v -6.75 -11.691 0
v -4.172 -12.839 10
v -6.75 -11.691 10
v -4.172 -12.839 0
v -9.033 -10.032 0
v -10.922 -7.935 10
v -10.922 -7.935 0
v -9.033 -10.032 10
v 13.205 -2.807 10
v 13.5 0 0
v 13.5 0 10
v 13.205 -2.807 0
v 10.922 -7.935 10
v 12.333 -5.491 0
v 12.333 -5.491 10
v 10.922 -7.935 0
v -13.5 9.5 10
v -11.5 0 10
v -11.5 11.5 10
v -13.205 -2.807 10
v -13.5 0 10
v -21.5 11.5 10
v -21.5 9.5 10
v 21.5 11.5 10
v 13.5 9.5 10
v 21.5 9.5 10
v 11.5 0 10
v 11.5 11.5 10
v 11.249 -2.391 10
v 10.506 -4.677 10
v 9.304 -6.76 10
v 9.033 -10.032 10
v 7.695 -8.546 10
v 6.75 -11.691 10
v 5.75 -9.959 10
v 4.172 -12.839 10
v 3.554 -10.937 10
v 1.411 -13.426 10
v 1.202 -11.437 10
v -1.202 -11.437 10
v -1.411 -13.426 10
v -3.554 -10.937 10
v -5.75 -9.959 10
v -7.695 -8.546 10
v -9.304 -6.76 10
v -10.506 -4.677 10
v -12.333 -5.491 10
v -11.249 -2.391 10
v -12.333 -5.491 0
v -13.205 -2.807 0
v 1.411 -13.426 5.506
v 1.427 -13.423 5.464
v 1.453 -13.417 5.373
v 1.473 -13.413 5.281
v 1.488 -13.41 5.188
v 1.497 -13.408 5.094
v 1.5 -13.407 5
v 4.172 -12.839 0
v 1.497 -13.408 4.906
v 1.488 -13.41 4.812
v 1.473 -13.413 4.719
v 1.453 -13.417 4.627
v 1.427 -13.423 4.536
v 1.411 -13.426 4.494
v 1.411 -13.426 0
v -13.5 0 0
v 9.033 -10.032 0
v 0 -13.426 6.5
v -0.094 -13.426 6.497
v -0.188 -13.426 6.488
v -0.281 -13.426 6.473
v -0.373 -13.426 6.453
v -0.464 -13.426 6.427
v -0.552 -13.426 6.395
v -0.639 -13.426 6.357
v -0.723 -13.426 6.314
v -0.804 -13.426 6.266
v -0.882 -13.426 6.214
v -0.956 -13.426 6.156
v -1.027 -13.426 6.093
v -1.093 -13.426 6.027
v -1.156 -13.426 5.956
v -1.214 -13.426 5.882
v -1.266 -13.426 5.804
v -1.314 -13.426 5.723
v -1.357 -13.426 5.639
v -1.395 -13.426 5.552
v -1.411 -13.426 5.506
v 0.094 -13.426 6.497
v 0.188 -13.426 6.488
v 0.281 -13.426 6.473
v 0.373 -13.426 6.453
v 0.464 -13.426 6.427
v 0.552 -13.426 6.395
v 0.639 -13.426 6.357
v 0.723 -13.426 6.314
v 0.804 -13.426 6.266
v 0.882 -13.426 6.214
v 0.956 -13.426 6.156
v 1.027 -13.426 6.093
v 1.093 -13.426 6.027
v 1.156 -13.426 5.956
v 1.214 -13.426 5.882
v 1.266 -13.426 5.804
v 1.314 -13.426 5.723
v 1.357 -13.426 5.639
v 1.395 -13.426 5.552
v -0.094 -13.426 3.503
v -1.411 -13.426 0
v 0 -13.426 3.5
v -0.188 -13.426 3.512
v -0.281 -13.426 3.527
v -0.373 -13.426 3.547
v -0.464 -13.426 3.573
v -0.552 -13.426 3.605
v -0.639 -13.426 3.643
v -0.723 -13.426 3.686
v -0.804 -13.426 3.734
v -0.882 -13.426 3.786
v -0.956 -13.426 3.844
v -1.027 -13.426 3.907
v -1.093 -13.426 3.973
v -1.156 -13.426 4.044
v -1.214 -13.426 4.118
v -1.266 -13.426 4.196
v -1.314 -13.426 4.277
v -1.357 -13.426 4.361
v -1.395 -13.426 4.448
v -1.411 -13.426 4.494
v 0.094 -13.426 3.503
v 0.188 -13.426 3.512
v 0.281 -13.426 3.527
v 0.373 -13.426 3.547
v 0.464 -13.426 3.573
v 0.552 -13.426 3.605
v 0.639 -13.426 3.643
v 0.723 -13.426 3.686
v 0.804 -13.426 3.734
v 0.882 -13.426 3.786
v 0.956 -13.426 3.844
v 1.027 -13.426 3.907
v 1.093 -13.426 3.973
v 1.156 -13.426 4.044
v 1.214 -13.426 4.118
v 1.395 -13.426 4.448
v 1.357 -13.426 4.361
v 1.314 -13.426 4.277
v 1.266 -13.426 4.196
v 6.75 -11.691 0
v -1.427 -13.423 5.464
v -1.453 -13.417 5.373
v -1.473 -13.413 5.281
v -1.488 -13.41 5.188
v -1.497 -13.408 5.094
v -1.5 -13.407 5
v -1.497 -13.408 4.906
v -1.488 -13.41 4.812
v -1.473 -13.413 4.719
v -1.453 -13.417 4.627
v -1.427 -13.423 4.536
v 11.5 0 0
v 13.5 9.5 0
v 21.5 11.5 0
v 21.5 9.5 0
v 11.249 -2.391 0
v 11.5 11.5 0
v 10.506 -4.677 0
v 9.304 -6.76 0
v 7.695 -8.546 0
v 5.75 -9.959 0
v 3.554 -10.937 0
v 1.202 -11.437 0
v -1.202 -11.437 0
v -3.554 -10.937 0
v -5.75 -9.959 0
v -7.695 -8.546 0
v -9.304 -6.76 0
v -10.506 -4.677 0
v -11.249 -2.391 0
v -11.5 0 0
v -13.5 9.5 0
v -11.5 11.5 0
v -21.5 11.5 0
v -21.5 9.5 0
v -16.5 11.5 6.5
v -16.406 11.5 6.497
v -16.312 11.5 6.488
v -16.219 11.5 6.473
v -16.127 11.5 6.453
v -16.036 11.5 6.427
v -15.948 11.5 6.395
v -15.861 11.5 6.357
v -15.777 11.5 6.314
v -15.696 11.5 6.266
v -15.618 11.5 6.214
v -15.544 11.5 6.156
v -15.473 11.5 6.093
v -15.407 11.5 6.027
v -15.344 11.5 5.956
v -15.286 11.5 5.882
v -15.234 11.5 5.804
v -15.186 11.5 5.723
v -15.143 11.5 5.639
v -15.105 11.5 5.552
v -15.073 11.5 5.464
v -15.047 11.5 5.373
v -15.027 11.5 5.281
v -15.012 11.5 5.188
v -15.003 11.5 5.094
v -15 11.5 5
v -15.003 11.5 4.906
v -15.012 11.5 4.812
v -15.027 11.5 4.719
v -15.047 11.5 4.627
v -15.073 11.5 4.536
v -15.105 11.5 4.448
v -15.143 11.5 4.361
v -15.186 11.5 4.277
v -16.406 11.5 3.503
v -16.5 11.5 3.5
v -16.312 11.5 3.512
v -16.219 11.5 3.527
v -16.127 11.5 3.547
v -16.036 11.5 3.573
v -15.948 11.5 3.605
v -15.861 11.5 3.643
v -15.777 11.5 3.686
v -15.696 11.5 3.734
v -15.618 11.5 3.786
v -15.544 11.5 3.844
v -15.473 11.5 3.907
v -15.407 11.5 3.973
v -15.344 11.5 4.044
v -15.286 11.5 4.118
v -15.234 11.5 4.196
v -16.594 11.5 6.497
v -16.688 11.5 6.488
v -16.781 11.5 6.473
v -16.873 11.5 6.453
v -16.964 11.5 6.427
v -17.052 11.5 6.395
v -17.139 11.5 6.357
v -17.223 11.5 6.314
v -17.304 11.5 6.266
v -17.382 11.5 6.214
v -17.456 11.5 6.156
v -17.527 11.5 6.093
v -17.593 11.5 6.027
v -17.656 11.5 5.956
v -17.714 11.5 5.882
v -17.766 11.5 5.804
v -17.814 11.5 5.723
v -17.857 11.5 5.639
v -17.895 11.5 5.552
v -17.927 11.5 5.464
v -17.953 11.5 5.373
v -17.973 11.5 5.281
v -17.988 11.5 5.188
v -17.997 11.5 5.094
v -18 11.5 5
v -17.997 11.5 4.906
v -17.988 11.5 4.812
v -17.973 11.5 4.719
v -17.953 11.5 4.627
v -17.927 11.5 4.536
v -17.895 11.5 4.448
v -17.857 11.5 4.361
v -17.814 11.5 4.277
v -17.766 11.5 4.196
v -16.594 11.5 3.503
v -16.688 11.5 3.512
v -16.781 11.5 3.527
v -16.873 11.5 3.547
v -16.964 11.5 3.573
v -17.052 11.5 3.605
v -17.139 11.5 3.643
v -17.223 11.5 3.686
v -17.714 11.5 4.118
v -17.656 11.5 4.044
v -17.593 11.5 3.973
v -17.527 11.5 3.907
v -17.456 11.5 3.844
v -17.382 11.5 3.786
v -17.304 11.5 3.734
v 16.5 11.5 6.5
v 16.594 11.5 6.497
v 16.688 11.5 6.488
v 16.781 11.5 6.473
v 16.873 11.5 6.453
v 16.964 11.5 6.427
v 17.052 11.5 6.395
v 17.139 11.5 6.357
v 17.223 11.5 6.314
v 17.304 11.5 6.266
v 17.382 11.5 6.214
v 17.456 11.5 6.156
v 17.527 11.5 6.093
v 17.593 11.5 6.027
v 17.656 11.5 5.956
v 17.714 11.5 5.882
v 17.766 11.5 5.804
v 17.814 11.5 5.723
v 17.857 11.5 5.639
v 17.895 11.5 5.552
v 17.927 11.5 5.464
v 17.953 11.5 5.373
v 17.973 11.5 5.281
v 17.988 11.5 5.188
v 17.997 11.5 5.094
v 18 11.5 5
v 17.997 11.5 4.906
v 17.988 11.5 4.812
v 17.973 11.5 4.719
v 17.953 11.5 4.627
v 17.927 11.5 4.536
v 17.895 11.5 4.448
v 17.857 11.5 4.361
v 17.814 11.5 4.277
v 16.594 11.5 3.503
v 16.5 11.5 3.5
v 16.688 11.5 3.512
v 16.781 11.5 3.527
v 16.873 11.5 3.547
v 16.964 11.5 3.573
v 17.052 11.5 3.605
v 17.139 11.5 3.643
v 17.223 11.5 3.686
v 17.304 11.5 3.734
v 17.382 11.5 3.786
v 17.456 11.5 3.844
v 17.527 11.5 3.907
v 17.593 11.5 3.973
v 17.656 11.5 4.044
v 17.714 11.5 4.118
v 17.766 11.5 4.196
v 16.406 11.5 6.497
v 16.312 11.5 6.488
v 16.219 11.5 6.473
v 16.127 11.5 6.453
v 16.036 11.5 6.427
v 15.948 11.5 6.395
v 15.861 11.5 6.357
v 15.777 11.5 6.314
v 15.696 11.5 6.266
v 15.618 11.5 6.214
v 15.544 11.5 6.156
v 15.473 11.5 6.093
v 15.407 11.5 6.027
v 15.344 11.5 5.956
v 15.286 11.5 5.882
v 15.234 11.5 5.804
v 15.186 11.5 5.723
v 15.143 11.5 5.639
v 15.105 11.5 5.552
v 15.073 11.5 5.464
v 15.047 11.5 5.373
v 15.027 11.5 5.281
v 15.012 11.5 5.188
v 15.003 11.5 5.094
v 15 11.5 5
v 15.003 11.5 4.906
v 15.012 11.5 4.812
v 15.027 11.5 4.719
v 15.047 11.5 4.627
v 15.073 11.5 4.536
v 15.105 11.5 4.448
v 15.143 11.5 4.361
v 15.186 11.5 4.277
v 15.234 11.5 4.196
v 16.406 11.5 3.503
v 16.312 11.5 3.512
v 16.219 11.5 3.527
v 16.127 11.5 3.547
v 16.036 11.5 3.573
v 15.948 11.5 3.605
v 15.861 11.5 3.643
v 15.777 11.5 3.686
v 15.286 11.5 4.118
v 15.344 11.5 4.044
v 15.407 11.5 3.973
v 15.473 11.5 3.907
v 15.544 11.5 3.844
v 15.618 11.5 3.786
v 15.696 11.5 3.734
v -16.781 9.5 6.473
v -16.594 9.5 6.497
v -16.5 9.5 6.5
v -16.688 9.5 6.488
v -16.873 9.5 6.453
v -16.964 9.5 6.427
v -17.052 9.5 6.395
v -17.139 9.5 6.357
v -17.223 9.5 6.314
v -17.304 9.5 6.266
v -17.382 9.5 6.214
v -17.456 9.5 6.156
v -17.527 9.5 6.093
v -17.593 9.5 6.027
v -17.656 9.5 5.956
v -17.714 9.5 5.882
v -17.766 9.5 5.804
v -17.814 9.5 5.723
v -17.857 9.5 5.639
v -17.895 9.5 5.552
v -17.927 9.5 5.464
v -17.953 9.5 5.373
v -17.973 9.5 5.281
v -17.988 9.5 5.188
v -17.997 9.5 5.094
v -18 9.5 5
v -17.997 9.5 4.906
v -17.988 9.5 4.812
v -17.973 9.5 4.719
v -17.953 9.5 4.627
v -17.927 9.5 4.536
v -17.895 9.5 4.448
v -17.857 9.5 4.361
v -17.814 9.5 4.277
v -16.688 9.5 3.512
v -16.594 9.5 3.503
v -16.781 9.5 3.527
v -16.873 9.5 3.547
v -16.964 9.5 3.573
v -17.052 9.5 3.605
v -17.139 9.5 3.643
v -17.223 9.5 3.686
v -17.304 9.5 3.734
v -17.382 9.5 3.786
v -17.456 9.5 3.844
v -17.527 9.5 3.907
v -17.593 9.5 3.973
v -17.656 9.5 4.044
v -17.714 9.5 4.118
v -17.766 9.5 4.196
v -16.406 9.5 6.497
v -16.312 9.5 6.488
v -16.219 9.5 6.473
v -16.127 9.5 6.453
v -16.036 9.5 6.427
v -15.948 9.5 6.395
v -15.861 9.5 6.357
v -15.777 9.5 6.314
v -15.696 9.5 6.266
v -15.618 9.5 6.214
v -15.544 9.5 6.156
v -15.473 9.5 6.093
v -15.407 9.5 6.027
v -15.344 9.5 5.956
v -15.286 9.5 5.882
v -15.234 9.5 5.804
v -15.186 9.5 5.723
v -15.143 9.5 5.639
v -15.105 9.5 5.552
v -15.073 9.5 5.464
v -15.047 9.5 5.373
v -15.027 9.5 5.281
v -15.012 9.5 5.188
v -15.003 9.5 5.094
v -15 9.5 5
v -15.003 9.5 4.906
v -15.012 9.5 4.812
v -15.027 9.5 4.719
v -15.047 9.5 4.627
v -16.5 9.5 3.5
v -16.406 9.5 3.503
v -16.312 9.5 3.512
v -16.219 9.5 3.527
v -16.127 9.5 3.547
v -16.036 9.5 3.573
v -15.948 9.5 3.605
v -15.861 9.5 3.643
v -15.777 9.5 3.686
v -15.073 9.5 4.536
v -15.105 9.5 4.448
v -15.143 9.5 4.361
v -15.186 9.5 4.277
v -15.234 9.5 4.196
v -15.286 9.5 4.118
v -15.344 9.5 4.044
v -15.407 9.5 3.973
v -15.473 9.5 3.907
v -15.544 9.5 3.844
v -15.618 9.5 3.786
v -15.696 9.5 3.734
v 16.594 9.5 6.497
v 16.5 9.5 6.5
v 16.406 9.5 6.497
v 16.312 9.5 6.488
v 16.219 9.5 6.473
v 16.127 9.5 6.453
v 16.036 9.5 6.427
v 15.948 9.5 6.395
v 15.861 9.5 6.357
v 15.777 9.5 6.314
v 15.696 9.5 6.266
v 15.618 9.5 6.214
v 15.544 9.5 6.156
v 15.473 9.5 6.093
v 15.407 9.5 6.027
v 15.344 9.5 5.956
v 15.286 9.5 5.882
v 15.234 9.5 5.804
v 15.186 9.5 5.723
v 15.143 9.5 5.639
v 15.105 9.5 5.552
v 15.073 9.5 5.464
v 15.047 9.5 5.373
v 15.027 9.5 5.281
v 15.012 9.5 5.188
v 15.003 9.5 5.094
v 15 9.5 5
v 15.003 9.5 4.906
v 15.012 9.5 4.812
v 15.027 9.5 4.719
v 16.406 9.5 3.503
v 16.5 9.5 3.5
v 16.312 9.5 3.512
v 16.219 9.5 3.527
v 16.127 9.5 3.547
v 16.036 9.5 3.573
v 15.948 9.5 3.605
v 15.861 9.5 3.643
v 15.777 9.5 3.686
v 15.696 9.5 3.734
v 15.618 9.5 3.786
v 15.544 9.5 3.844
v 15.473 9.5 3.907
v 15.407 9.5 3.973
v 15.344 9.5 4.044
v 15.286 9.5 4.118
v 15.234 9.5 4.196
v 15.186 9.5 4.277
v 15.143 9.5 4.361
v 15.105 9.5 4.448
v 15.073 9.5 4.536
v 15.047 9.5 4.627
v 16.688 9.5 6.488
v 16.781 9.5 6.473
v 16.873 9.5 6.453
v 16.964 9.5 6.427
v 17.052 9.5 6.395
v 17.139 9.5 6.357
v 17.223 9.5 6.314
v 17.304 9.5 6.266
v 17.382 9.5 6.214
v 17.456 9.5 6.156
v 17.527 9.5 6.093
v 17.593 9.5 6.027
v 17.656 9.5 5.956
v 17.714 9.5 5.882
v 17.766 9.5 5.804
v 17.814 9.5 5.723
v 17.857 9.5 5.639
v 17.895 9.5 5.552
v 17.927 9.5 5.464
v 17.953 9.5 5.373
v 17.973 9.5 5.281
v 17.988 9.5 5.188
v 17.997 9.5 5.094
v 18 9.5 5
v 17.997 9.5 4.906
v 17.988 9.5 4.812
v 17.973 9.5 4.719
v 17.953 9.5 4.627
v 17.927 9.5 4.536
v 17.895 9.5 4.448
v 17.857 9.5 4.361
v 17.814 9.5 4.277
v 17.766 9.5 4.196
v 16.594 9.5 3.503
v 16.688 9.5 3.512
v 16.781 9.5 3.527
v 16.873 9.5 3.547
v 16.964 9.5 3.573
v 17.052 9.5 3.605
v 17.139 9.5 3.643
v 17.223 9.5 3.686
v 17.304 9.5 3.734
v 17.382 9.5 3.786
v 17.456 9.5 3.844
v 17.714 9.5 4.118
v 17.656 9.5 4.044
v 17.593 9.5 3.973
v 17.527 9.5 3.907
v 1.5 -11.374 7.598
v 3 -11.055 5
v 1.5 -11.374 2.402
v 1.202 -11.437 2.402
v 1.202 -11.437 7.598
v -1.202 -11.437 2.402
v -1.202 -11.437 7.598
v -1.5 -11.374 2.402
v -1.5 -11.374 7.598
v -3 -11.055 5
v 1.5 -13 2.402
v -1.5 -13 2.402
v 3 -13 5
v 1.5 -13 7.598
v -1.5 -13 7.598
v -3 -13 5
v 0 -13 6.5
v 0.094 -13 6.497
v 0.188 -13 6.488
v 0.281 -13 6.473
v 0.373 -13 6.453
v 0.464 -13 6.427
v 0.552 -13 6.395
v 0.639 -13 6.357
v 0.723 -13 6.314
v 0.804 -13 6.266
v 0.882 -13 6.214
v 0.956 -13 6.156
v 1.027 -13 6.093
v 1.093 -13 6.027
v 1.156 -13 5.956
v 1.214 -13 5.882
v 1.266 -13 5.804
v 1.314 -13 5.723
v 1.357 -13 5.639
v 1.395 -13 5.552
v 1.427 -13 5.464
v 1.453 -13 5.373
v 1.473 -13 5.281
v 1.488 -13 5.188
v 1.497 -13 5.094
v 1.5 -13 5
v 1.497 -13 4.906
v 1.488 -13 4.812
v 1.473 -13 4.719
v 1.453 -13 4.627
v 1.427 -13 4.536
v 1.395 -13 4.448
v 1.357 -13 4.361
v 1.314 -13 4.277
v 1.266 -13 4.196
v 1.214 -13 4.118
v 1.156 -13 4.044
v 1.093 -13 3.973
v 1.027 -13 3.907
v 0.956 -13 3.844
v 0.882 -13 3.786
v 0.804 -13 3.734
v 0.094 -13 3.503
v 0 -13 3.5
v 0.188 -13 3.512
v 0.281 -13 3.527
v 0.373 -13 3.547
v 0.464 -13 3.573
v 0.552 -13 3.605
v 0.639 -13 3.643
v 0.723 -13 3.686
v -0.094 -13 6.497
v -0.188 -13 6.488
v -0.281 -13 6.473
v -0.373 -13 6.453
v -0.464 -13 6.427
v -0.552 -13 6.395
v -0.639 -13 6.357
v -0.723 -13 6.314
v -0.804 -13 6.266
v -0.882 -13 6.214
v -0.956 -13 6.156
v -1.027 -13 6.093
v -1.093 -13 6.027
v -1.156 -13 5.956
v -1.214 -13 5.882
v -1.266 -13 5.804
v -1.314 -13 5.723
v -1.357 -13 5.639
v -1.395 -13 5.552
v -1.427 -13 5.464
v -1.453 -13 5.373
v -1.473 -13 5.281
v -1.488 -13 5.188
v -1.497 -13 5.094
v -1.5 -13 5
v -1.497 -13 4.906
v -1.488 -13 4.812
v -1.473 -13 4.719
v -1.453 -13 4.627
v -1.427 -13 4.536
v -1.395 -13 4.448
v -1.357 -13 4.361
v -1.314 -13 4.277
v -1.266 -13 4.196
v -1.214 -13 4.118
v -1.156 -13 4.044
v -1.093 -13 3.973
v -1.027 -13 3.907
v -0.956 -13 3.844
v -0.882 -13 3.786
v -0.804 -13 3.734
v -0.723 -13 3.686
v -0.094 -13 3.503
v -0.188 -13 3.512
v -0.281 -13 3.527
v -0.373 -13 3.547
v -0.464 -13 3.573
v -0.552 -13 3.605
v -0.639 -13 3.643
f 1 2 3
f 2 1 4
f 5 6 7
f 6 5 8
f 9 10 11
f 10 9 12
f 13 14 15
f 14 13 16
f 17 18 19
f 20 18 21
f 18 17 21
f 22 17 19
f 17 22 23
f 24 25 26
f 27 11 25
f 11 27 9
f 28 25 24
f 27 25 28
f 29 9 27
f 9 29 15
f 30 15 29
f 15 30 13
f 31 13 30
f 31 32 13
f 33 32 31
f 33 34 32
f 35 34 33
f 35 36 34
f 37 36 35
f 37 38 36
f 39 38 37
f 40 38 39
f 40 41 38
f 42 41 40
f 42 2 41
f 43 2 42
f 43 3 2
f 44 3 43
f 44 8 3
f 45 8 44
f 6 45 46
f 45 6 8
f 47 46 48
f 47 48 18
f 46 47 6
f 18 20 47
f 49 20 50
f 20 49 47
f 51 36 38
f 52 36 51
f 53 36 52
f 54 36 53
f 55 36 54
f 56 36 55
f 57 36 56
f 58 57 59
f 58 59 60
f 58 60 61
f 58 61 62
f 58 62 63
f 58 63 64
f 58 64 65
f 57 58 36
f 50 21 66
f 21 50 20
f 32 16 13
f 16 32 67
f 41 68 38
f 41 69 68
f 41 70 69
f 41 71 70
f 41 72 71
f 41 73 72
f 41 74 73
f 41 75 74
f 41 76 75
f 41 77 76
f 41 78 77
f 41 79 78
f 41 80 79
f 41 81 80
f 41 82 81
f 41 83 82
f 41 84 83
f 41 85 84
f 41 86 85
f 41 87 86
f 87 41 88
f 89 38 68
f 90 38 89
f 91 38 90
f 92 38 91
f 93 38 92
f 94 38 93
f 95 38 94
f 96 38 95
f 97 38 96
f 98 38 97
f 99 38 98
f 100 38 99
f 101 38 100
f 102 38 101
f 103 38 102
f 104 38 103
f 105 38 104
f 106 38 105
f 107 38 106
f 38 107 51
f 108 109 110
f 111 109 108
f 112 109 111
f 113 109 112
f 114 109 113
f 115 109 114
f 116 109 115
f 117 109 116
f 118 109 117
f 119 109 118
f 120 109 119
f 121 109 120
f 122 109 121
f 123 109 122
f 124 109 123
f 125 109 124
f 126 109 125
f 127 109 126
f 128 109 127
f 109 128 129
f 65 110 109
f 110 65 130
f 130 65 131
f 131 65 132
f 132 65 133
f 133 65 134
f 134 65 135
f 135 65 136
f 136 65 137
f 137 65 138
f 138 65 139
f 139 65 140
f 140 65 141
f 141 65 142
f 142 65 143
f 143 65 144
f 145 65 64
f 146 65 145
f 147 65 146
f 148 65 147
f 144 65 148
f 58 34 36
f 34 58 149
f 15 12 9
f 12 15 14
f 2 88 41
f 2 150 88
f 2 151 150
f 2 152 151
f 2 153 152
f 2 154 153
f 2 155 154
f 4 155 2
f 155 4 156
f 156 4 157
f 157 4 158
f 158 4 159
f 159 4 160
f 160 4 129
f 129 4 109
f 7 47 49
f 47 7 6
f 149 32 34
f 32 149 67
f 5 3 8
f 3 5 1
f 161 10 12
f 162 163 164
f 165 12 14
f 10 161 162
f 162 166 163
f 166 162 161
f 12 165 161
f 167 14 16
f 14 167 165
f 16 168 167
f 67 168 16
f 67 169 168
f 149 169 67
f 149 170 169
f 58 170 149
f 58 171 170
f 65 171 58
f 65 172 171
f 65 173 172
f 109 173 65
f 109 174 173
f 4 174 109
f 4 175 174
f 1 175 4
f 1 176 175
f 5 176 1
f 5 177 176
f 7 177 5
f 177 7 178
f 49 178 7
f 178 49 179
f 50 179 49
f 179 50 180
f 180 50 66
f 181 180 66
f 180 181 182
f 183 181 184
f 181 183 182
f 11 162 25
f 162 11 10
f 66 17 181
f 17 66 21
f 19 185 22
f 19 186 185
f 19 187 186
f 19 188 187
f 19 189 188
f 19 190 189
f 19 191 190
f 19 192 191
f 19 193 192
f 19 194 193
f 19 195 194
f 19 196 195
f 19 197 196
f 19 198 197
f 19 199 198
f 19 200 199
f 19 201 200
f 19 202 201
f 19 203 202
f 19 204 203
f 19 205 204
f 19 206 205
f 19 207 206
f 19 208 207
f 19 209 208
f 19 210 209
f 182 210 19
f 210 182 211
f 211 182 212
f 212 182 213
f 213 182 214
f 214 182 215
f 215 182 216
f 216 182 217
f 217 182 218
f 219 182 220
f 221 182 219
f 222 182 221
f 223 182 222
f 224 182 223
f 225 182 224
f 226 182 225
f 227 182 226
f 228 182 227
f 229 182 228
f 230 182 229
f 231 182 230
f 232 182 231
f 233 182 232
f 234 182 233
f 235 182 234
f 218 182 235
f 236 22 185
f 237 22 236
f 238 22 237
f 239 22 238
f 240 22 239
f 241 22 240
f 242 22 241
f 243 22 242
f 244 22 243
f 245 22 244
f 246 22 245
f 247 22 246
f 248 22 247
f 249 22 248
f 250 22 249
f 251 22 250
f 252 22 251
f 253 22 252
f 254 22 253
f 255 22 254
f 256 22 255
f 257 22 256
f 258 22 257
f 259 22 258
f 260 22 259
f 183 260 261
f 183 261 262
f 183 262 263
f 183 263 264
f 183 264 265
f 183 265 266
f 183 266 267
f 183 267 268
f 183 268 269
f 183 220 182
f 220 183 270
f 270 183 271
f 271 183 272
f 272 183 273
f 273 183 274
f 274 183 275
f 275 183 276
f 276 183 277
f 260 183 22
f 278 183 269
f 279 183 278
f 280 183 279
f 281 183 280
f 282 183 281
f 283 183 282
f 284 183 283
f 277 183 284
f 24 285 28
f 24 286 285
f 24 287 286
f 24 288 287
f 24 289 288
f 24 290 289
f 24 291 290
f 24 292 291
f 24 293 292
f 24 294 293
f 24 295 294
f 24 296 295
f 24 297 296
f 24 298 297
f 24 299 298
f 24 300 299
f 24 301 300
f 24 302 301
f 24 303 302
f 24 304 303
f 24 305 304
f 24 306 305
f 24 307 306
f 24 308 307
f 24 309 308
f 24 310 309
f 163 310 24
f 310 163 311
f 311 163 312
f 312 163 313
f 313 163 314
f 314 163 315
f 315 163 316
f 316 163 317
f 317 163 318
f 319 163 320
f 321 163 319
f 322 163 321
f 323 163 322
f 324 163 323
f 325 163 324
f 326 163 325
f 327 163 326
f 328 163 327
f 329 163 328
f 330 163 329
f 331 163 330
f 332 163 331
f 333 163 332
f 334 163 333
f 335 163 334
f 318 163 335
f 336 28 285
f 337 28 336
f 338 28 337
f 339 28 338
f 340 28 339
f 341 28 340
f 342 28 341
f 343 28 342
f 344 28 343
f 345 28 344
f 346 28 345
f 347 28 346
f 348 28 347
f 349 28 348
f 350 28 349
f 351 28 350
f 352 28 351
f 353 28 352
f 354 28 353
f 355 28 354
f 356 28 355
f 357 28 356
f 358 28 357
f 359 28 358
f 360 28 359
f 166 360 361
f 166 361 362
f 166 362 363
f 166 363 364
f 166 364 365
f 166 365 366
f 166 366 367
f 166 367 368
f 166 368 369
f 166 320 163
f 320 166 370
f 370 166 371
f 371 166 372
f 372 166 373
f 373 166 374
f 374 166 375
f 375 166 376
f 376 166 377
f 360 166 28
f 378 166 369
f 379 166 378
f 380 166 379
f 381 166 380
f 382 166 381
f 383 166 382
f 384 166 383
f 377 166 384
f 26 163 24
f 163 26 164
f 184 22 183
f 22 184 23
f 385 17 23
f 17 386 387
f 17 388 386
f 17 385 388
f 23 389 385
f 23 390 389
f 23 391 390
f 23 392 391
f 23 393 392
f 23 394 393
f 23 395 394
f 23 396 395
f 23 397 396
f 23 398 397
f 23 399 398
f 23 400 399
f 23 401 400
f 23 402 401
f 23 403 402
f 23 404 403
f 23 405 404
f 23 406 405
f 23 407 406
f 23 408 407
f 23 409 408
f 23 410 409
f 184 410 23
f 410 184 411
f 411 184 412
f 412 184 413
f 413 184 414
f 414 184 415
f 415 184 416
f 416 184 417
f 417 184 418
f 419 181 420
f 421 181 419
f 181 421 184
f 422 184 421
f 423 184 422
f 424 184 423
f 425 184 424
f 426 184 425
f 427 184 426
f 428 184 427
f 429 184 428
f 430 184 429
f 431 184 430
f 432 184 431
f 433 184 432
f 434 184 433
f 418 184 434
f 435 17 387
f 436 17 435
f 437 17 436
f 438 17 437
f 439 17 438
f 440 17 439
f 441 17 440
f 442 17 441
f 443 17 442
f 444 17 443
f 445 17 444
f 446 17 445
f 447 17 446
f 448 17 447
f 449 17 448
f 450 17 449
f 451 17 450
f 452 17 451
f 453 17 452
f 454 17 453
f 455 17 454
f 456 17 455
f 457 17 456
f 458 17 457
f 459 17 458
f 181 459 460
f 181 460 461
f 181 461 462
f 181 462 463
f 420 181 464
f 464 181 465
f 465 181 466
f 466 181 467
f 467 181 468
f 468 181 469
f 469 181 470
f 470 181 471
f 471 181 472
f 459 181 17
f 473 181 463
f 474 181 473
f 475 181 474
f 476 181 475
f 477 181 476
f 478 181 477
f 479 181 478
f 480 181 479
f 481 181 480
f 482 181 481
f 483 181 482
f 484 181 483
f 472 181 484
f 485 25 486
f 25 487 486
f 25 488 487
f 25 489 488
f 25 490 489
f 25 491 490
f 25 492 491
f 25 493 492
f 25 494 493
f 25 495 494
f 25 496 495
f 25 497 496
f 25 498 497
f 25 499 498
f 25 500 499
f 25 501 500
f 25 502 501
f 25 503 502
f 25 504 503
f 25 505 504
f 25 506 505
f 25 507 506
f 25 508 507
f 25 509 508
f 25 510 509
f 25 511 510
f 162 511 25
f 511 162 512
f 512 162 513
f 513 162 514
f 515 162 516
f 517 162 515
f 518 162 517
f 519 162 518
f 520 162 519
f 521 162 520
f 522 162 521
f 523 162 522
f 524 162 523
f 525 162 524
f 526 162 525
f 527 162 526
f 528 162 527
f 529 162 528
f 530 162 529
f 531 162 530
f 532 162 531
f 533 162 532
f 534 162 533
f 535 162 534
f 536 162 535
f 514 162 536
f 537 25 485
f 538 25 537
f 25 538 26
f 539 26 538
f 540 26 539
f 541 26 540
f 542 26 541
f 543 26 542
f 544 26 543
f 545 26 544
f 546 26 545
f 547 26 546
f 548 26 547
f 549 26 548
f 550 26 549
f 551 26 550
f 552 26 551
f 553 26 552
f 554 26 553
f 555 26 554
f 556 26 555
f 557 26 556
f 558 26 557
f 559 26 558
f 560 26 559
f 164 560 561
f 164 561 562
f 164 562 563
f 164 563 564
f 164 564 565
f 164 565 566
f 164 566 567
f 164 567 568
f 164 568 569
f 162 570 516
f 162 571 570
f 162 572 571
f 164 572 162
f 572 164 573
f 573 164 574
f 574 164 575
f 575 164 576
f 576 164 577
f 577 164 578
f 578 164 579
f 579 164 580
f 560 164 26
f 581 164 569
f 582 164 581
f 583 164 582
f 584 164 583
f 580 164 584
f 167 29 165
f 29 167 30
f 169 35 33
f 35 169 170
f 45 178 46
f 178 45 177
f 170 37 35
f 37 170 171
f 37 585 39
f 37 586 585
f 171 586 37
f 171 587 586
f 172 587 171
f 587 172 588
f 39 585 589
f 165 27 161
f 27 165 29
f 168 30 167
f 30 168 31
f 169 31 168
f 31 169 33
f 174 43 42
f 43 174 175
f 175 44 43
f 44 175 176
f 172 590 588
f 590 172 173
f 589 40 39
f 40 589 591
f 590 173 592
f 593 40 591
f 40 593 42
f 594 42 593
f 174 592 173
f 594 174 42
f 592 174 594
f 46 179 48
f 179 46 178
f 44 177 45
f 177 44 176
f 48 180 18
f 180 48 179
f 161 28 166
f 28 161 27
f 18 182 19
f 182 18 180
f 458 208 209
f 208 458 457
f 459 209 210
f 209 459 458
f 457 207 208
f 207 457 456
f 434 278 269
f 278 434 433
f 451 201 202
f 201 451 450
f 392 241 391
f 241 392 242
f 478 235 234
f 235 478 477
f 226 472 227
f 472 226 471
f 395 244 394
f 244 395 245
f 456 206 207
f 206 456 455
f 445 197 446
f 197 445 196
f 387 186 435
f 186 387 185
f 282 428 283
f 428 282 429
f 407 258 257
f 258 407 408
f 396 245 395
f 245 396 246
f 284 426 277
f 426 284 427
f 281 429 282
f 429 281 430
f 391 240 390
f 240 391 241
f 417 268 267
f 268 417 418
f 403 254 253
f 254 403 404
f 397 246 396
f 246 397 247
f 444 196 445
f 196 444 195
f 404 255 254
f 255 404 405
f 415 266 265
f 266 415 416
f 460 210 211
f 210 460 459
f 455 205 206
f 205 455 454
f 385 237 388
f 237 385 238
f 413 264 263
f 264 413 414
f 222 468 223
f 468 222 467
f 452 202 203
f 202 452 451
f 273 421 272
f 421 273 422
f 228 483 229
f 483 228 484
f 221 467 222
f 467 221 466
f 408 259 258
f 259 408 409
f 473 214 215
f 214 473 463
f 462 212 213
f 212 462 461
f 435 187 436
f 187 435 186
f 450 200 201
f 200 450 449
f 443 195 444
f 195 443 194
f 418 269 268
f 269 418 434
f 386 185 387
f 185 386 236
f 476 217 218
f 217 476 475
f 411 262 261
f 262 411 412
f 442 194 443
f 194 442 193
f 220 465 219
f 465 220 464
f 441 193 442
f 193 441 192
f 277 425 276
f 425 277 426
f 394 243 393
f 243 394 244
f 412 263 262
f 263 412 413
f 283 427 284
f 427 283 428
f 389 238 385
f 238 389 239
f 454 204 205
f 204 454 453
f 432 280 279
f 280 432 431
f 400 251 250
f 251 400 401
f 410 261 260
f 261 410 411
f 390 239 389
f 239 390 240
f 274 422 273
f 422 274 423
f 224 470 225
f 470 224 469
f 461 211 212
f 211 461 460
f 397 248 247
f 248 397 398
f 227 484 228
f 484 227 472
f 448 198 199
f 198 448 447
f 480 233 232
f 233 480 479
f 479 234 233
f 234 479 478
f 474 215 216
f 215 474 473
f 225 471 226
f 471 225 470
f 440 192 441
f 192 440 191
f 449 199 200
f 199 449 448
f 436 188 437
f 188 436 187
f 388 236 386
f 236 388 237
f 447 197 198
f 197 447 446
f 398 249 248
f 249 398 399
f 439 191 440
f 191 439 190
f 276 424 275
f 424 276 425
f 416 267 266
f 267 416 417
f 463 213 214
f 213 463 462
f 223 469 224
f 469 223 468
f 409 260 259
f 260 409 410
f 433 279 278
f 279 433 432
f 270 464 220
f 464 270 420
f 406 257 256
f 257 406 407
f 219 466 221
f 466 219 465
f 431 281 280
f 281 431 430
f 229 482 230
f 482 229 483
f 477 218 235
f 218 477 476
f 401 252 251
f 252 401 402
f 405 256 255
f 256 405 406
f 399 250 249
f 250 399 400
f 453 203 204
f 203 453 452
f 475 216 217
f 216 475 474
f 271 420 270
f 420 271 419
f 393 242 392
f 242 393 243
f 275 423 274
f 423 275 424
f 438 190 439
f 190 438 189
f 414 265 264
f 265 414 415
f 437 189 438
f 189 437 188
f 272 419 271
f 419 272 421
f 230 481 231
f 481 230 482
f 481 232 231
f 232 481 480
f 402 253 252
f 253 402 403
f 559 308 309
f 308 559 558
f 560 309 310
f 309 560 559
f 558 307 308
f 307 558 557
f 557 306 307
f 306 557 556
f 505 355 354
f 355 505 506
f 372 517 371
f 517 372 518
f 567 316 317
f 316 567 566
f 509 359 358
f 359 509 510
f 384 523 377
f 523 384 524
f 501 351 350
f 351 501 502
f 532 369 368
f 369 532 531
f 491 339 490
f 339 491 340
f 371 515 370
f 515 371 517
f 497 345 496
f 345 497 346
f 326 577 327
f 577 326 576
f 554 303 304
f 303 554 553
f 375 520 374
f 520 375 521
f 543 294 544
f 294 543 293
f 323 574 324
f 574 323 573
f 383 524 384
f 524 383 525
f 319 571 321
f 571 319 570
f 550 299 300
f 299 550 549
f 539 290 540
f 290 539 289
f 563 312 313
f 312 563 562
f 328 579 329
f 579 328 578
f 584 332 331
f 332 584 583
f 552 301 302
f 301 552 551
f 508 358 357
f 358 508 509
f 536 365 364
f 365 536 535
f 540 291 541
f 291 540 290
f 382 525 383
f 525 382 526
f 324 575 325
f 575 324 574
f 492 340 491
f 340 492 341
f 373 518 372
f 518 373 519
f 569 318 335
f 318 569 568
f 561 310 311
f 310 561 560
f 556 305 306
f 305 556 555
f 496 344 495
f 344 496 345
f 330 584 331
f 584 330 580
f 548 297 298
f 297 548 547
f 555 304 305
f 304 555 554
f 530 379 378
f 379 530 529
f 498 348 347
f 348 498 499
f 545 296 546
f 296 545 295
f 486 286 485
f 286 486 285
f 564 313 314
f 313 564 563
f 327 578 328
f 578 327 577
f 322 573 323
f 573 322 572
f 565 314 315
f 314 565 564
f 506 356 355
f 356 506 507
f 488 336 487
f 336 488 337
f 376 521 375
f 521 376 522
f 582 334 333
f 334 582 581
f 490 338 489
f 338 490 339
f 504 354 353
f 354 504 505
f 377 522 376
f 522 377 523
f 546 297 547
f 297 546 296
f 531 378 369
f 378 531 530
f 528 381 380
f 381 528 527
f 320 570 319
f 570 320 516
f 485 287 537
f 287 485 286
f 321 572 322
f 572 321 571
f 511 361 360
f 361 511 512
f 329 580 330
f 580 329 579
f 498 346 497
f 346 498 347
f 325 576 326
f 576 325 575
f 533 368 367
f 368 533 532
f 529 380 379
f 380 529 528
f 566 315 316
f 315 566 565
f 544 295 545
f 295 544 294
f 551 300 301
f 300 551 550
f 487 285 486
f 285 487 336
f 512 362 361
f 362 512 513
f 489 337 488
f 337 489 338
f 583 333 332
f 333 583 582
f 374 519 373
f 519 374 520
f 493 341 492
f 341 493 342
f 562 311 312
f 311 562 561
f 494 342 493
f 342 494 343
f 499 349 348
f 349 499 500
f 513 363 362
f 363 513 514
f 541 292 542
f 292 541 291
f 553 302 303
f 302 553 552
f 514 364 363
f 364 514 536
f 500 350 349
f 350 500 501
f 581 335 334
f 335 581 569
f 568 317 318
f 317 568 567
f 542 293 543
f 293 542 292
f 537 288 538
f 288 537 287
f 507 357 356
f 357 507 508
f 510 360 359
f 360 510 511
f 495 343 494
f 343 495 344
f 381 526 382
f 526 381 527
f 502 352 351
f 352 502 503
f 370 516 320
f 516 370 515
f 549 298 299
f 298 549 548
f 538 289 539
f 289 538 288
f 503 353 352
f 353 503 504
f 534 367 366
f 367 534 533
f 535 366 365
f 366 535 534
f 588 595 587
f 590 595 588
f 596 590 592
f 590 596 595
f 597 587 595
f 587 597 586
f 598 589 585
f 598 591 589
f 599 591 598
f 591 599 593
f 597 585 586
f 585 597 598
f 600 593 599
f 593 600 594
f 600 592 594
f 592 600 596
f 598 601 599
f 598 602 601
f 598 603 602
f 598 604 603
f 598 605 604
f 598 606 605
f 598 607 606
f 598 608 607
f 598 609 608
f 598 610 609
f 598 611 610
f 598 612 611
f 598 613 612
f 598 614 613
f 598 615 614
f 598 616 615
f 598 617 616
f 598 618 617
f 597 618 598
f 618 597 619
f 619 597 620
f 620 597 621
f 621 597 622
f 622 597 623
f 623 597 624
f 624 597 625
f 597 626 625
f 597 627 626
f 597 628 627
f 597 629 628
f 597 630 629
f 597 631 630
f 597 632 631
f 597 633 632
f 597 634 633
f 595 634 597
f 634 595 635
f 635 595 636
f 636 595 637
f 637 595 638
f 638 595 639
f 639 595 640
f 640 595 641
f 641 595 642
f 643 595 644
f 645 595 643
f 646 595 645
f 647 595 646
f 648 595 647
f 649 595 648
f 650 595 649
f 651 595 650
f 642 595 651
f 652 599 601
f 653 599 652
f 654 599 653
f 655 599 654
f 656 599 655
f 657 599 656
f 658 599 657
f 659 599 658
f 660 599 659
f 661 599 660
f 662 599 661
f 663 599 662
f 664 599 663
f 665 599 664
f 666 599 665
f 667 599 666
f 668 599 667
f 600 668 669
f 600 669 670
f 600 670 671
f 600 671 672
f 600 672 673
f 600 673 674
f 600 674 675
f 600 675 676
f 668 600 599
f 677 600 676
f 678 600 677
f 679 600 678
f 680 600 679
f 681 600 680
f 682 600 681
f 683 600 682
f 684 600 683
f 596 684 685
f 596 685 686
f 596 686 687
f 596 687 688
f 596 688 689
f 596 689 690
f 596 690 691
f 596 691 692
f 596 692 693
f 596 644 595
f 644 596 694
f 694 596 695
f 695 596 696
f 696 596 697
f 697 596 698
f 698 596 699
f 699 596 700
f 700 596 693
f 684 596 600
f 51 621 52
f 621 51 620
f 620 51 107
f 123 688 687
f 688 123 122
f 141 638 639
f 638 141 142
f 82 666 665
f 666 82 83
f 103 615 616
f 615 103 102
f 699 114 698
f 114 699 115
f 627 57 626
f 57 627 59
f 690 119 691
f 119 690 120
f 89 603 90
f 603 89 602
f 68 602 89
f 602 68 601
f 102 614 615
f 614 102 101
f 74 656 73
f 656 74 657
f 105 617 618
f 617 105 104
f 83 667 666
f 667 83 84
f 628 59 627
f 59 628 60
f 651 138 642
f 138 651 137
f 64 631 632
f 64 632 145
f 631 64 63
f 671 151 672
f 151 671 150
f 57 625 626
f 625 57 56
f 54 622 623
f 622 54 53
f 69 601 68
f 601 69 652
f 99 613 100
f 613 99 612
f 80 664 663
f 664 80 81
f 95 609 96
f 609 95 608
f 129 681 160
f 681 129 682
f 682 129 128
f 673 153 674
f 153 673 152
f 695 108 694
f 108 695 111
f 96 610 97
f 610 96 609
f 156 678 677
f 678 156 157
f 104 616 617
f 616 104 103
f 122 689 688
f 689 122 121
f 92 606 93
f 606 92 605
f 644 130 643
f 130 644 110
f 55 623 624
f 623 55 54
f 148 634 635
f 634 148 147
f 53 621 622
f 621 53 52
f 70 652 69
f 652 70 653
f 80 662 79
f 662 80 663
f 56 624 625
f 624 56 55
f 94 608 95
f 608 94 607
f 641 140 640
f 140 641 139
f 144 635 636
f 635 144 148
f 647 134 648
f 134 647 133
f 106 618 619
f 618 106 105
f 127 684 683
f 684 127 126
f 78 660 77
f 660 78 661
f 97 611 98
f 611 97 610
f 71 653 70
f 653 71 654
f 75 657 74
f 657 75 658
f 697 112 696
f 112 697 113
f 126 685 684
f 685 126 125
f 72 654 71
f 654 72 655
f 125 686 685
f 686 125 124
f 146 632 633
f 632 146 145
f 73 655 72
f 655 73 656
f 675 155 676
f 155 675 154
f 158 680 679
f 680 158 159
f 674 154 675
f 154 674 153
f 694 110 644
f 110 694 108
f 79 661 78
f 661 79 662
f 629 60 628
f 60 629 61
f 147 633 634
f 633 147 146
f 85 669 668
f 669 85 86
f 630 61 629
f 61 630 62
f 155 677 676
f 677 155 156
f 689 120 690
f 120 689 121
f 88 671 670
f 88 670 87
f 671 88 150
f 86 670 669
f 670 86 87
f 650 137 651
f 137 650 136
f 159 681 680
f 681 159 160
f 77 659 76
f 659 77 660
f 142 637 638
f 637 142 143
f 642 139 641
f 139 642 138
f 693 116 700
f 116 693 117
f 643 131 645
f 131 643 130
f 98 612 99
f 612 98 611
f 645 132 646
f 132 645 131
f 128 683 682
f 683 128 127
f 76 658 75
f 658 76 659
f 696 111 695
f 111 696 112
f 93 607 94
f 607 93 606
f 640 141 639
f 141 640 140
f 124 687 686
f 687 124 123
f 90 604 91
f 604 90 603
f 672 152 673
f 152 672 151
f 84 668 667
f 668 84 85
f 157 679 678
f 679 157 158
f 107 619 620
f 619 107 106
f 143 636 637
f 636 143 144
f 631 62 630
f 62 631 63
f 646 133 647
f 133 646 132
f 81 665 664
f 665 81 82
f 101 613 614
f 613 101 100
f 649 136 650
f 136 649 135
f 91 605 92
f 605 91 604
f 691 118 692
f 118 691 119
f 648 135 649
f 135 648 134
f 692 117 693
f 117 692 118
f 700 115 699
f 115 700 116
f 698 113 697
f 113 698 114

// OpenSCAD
d=23;
h=10;
w=2;
flange_length=10;
difference(){
	union(){
		cylinder(r=d/2+w,h=h);
		translate([-d/2-w,0,0]) cube([d+2*w,d/2,h]);
		translate([-d/2-flange_length,d/2-w]) cube([flange_length*2+d,w,h]);
	}
	union(){
		translate([0,0,-1]){
#			cylinder(r=d/2,h=h+2);
			translate([-d/2,0,0]) cube([d,d,2*h]);
		}
		translate([0,0,h/2]) rotate([90,0]){
			cylinder(r=3,$fn=6,h=d/2+1.5);
			cylinder(r=3/2,$fn=100,h=d/2+100);
			for(i=[-1,1]) translate([i*(d/2+flange_length/2),0,-d/2+w/2]) cylinder(r=3/2,$fn=100,h=w*2,center=true);
		}
	}
}
